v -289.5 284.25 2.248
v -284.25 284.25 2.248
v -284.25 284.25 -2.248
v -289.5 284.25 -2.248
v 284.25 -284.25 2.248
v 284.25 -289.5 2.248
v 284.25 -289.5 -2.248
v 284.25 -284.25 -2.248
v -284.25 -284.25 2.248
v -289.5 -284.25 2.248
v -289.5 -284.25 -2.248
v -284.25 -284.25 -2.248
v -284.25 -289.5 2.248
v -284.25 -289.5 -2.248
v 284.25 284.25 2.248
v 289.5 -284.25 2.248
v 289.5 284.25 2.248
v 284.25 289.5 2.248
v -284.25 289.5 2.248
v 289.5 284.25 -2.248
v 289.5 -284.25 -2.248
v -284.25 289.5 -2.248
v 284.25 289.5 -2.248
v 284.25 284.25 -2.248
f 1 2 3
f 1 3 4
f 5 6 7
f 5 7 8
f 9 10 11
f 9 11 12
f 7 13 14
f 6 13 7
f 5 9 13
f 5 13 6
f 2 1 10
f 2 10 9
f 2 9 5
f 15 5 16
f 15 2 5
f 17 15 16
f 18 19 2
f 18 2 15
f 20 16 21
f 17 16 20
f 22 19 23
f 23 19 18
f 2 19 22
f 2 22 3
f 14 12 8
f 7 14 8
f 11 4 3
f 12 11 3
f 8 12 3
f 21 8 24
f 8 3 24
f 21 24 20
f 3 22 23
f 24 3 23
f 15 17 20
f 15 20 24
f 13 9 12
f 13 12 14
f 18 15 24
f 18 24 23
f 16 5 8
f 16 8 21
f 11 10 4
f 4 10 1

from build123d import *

# Parameters (mm, degrees)
SKETCH1_W           = 579
SKETCH1_H           = 579
BOSS_EXTRUDE1_DEPTH = 2.2479
CUT_EXTRUDE1_DEPTH  = 4.4958


with BuildPart() as part:
    # Sketch1 → Boss-Extrude1 (new body, symmetric)
    with BuildSketch(Plane.XY):
        Rectangle(SKETCH1_W, SKETCH1_H)
    extrude(amount=BOSS_EXTRUDE1_DEPTH, both=True)

    # Sketch2 → Cut-Extrude1 (cut)
    with BuildSketch(Plane.XY.offset(2.2479)):
        Polygon((-284.25, 303.749993563), (-284.25, 284.249993563), (-303.75, 284.249993563), align=None)
        Polygon((-303.75, -284.250006437), (-284.25, -284.250006437), (-284.25, -303.750006437), align=None)
        Polygon((284.25, -303.750006437), (284.25, -284.250006437), (303.75, -284.250006437), align=None)
        Polygon((303.75, 284.249993563), (284.25, 284.249993563), (284.25, 303.749993563), align=None)
    extrude(amount=-CUT_EXTRUDE1_DEPTH, mode=Mode.SUBTRACT)


solid = part.part
